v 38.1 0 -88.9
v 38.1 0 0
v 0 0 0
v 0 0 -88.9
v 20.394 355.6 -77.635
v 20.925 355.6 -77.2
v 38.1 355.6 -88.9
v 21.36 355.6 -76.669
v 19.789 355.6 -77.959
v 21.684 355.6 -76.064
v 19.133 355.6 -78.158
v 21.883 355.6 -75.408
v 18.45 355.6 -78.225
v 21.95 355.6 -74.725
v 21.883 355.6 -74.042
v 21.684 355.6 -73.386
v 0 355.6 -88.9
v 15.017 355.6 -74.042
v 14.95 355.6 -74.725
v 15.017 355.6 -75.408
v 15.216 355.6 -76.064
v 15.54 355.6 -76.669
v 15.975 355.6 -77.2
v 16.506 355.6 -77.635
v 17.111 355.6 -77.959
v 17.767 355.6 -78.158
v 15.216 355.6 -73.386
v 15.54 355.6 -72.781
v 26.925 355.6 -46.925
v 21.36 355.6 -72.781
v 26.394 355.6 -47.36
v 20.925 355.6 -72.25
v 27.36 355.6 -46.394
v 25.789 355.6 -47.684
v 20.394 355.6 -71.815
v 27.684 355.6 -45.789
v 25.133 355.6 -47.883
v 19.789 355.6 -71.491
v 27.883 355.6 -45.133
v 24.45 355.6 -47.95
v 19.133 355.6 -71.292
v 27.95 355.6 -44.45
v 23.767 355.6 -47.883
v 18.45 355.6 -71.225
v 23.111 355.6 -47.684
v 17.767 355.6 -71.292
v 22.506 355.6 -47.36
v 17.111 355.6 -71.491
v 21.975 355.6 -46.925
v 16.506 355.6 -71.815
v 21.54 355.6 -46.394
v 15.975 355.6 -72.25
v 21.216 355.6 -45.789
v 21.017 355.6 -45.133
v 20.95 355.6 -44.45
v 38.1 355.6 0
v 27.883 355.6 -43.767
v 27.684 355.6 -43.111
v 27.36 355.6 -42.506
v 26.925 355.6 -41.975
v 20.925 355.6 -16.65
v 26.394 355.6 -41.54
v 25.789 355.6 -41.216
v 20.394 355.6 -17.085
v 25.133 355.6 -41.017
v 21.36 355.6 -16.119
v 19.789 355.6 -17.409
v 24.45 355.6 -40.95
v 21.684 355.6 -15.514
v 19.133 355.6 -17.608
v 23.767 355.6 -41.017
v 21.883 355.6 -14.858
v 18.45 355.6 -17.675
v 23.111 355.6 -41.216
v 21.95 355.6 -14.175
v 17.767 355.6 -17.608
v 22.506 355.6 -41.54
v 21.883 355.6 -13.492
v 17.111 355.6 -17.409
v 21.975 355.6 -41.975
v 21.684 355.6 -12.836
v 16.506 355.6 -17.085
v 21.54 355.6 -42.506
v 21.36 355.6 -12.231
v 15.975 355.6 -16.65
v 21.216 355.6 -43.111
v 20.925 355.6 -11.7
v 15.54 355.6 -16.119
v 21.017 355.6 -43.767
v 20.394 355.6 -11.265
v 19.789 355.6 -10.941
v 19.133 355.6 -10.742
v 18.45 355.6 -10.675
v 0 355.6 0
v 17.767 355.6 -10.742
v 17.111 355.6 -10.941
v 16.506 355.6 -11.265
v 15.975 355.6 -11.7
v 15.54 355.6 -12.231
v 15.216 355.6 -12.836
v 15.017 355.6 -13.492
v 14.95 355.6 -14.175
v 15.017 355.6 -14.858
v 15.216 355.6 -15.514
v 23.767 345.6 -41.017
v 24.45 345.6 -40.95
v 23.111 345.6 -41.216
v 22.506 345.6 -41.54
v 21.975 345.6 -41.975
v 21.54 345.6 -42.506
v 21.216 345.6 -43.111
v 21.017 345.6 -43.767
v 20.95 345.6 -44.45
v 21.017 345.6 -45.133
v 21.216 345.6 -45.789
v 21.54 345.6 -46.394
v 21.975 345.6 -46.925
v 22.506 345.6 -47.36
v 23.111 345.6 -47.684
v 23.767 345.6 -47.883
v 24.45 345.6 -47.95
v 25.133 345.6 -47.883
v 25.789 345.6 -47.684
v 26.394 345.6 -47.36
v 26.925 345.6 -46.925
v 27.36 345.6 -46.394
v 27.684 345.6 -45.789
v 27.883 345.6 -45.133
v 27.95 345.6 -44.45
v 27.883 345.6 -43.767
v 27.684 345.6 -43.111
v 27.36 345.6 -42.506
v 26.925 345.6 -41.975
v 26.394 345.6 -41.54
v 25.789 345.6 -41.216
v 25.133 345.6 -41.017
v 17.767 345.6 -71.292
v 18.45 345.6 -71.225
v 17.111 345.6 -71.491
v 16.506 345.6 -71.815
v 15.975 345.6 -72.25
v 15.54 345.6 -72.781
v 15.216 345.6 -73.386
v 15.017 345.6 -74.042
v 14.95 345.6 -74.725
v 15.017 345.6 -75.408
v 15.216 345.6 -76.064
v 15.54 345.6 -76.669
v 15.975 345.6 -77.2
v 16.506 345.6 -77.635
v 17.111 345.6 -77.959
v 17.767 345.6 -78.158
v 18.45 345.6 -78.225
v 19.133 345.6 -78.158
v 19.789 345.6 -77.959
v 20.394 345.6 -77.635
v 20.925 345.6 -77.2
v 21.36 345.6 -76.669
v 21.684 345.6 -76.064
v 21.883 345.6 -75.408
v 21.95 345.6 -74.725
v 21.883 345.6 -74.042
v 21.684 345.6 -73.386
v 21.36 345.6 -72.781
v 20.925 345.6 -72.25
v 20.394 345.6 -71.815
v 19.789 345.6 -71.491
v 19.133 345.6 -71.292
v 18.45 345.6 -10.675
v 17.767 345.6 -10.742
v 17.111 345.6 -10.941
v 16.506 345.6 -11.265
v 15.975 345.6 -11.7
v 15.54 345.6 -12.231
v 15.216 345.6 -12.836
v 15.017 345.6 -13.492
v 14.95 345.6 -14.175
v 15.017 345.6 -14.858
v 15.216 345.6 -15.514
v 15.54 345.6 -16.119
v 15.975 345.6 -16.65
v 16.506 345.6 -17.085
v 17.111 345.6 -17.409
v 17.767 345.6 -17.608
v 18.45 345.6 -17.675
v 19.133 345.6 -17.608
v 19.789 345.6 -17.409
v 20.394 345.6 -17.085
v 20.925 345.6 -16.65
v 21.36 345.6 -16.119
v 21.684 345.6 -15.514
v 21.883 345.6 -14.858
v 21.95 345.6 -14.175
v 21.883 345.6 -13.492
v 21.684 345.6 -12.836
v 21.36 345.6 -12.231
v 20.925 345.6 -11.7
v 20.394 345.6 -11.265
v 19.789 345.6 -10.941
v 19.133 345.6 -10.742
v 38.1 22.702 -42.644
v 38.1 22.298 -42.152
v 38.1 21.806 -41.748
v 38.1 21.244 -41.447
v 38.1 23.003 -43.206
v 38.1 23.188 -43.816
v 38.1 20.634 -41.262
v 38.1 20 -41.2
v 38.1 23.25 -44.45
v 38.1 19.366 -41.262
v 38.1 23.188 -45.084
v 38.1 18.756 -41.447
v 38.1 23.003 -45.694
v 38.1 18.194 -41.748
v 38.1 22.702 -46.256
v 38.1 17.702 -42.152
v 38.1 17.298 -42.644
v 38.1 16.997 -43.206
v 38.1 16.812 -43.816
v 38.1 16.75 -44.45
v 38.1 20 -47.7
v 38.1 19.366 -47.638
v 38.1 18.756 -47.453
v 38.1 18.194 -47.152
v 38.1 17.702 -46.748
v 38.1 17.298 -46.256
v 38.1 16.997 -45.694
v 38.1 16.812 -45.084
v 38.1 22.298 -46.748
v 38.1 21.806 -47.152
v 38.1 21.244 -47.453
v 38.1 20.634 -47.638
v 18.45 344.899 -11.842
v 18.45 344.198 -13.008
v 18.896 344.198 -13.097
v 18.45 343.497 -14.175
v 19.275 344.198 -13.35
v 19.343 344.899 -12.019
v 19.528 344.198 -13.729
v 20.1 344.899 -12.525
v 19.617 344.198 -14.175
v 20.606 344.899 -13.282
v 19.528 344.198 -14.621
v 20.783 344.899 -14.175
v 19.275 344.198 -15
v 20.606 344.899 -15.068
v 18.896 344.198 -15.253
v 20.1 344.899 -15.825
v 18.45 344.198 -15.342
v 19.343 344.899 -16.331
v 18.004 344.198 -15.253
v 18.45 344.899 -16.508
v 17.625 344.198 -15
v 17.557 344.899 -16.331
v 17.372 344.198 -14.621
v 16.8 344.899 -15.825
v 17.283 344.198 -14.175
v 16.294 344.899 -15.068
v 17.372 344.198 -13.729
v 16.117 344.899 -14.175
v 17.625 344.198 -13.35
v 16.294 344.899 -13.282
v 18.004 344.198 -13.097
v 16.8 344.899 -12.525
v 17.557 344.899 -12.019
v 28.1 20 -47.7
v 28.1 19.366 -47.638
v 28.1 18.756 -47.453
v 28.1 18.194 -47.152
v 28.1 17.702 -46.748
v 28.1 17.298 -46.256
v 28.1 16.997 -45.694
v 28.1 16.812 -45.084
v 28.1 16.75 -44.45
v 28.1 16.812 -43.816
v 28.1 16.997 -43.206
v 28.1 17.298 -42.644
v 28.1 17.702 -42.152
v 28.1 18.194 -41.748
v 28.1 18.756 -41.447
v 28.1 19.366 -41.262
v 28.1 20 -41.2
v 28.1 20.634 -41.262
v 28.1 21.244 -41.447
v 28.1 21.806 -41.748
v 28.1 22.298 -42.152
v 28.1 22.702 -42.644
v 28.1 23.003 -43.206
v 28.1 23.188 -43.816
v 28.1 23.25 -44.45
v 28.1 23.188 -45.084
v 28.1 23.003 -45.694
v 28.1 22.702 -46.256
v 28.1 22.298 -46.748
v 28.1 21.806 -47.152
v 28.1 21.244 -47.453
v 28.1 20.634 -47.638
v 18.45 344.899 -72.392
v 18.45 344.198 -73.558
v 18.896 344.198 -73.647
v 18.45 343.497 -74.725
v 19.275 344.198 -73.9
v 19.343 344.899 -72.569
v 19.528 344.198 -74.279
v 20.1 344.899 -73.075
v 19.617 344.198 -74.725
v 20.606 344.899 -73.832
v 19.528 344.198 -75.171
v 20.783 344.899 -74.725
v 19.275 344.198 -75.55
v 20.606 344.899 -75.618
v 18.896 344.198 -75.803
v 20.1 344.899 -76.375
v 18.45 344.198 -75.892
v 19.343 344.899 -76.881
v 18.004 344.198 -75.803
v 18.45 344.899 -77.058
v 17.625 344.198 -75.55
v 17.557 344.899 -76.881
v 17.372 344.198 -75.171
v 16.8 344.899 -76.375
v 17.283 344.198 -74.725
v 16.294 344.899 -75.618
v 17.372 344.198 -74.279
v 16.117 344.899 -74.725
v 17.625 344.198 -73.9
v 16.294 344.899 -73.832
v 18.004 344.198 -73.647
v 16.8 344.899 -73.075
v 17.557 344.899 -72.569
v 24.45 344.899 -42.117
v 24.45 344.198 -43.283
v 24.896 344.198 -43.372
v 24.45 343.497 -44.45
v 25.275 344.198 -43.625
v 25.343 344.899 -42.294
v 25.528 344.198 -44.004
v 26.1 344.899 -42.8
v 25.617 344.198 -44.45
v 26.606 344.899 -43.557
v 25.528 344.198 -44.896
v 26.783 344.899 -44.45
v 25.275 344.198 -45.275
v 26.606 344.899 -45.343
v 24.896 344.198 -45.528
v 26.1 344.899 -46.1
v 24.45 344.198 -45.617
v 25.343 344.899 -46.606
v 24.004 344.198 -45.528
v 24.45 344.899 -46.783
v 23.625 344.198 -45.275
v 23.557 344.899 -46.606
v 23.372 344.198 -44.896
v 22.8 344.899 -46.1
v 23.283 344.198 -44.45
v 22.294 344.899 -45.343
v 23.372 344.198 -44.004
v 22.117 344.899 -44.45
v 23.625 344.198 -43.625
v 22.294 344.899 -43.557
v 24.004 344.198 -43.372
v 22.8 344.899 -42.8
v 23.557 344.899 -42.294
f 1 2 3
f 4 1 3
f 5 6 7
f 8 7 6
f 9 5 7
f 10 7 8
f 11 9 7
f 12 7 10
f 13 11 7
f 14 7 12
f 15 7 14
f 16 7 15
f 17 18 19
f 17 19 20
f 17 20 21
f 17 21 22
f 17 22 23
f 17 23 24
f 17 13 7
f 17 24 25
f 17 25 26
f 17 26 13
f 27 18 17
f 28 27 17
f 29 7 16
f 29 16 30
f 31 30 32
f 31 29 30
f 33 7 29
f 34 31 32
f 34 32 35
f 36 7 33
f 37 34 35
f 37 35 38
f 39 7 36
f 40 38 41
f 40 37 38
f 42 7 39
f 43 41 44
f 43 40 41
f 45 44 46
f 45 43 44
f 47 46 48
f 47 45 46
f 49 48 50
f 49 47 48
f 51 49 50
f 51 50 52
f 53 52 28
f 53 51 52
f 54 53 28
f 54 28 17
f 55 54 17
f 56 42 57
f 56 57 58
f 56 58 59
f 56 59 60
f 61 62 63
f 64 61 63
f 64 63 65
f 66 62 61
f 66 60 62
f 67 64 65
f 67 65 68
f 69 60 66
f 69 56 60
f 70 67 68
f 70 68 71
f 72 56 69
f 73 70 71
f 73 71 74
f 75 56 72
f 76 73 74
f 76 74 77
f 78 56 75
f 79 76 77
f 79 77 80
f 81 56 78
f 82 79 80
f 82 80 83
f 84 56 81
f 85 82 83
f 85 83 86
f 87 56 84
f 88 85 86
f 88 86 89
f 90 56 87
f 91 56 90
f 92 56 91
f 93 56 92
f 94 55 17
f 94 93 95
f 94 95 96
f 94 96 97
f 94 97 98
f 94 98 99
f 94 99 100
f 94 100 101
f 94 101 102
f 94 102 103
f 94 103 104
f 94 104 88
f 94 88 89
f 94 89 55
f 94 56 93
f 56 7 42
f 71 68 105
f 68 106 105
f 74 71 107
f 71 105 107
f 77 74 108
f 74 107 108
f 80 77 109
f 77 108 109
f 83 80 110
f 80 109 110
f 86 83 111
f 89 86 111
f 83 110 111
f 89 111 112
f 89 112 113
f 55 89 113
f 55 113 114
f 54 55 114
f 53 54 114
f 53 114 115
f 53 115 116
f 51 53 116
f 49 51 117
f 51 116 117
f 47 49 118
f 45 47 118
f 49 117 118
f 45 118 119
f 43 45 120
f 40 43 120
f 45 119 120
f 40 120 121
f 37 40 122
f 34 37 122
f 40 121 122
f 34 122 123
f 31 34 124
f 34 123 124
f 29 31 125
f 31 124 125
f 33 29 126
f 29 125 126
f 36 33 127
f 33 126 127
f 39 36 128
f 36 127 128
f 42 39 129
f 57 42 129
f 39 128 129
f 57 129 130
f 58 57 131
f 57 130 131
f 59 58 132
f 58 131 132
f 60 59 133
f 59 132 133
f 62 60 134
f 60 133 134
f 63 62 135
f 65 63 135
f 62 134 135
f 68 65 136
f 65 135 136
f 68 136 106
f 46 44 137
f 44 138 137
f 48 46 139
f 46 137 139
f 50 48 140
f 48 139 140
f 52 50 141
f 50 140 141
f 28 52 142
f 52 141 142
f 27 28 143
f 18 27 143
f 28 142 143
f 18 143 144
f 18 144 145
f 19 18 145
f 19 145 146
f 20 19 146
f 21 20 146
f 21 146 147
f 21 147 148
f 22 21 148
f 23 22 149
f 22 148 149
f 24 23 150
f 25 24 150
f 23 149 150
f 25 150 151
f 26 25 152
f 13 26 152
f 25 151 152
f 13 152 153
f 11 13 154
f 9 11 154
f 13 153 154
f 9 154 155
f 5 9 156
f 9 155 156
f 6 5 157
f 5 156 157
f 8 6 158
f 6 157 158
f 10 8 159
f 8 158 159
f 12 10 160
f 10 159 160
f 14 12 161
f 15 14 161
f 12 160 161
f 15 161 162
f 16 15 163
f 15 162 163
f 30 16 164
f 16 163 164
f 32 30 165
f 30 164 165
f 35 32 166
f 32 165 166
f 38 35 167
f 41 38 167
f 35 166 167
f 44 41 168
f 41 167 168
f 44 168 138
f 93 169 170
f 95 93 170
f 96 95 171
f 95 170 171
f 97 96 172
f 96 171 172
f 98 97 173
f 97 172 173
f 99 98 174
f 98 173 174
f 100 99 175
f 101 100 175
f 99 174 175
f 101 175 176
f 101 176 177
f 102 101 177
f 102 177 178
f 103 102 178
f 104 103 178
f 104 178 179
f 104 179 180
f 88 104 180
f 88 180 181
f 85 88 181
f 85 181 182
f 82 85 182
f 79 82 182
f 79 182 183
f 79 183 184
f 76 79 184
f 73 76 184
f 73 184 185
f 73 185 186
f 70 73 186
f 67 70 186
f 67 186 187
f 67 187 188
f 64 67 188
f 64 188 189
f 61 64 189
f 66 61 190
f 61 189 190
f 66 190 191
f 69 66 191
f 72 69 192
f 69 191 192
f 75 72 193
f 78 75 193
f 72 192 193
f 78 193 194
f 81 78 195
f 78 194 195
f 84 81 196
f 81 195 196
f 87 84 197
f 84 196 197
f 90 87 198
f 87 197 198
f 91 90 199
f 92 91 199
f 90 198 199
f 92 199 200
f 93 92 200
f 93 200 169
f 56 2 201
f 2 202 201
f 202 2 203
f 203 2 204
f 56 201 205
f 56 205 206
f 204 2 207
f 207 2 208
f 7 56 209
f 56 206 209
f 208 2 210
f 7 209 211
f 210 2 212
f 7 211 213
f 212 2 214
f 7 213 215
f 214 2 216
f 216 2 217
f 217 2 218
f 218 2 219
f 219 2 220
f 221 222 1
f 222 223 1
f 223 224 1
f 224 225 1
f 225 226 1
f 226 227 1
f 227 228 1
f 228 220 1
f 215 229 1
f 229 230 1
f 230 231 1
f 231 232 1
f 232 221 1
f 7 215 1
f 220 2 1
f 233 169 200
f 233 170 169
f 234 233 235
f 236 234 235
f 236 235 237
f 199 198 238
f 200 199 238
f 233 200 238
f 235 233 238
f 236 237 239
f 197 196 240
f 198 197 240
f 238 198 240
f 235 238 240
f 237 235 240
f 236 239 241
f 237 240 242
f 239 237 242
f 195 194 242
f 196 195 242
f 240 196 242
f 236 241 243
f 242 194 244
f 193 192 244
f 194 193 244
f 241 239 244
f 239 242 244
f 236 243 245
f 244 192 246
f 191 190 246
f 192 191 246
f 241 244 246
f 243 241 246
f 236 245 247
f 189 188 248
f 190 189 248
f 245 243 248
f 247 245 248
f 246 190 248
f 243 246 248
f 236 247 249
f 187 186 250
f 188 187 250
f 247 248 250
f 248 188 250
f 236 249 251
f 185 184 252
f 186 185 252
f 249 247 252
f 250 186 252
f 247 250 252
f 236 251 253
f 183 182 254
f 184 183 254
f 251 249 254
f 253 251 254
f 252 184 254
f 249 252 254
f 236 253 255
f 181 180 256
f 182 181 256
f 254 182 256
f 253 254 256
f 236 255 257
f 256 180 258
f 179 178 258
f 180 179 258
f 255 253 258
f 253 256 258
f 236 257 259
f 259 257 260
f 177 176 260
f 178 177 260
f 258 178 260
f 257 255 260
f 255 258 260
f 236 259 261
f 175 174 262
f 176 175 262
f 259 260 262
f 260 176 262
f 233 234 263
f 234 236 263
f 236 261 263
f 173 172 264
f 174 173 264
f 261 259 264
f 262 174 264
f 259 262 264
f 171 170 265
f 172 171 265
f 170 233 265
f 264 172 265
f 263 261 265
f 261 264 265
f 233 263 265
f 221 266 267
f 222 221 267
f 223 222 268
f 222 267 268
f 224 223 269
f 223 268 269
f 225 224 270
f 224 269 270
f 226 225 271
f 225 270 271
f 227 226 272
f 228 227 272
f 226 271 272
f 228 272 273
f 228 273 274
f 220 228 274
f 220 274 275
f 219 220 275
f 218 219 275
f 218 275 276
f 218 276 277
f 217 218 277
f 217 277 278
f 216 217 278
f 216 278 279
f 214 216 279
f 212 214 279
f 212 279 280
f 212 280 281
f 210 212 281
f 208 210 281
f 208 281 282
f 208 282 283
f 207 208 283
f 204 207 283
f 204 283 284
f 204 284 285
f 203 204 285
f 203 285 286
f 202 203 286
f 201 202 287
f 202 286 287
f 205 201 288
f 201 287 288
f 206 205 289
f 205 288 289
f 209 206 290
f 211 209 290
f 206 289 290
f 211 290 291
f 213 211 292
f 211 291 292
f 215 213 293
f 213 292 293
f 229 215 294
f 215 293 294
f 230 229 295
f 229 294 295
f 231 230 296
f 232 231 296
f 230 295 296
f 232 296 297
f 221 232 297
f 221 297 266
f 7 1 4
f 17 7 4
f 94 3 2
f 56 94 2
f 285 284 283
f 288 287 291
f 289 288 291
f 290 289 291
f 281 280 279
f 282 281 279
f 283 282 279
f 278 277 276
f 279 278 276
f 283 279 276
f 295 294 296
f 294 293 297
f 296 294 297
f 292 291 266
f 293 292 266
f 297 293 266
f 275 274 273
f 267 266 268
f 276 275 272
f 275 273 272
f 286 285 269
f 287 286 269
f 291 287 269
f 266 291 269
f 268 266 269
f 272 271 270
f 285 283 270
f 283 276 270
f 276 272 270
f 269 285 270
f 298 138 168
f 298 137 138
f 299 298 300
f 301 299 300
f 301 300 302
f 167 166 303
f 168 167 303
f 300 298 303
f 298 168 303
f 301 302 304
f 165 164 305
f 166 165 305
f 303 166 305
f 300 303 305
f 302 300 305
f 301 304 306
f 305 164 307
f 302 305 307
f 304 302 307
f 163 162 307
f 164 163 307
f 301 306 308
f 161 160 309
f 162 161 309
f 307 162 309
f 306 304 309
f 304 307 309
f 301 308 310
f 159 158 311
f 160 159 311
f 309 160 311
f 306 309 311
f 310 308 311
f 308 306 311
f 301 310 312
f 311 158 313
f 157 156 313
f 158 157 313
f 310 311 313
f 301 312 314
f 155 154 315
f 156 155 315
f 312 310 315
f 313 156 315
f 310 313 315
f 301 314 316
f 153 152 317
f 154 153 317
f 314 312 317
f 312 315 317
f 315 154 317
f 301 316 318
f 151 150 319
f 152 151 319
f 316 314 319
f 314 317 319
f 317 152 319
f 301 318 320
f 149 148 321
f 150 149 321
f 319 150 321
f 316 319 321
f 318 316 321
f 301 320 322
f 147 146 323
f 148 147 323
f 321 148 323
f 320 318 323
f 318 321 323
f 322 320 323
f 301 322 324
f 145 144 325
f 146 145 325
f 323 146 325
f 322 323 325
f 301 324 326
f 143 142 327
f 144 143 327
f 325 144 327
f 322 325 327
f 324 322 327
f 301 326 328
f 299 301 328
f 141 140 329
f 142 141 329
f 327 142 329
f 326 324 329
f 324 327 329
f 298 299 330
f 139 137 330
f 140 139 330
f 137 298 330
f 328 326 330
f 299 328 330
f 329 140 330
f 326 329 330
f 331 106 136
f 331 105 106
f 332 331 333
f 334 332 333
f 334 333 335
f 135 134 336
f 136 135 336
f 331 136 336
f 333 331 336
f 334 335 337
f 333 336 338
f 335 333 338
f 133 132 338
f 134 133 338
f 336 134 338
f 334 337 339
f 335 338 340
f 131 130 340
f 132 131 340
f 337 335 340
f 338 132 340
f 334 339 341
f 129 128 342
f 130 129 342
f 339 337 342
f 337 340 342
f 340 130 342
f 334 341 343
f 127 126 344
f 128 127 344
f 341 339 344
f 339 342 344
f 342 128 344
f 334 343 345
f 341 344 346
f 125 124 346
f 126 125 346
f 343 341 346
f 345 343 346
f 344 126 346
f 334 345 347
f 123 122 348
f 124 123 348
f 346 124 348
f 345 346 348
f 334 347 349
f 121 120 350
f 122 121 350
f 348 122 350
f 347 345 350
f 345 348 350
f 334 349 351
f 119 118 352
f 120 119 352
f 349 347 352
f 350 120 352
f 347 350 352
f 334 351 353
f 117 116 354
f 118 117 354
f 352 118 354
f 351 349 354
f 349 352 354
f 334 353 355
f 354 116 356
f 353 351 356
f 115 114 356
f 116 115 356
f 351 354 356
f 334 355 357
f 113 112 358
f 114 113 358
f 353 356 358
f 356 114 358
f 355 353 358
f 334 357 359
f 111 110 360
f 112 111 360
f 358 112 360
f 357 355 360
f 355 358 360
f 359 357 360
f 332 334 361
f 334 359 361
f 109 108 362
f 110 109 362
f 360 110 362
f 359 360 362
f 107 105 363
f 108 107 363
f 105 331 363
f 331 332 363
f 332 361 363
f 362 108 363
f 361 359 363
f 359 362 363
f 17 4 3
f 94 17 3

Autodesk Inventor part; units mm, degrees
ref_plane "YZ Plane" through (0, 0, 0) normal (1, 0, 0) x (0, 1, 0)
ref_plane "XZ Plane" through (0, 0, 0) normal (0, 1, 0) x (-1, 0, 0)
ref_plane "XY Plane" through (0, 0, 0) normal (0, 0, 1) x (1, 0, 0)
sketch "Sketch1" plane through (0, 0, 0) normal (0, 1, 0) x (-1, 0, 0)
  line L0 (0, 0) -> (-38.1, 0)
  line L1 (-38.1, 0) -> (-38.1, -88.9)
  line L2 (-38.1, -88.9) -> (0, -88.9)
  line L3 (0, -88.9) -> (0, 0)
  dimension "d0" = 38.1
  dimension "d1" = 88.9
extrude "Extrusion1" add sketch "Sketch1" along normal blind 355.6
sketch "Sketch3" plane through (0, 355.6, 0) normal (0, 1, 0) x (1, 0, 0)
  line L0 (0, 88.9) -> (0, 0) projected
  line L1 (0, 74.725) -> (18.45, 74.725)
  line L2 (18.45, 74.725) -> (18.45, 0) construction
  line L3 (18.45, 0) -> (0, 0)
  line L4 (0, 0) -> (0, 74.725)
  line L5 (38.1, 88.9) -> (0, 88.9) projected
  line L6 (18.45, 74.725) -> (18.45, 61.2)
  line L7 (18.45, 74.725) -> (18.45, 14.175)
  line L8 (18.45, 44.45) -> (24.45, 44.45)
  line L9 (0, 0) -> (38.1, 0) projected
  dimension "d35" = 60.55
  dimension "d42" = 6
  dimension "d43" = 30.275
  dimension "d45" = 14.175
  dimension "d46" = 14.175
  dimension "d48" = 24.45
  dimension "d49" = 44.45
hole "Hole1" at (18.45, 355.6, -74.725) at (24.45, 355.6, -44.45) at (18.45, 355.6, -14.175) direction (0, -1, 0) diameter 7 depth 10 tip angle 118
sketch "Sketch4" plane through (38.1, 0, 0) normal (1, 0, 0) x (0, 0, -1)
  line L0 (0, 0) -> (88.9, 0) projected
  line L1 (0, 0) -> (44.45, 0) construction
  line L2 (44.45, 0) -> (44.45, 20) construction
  line L3 (44.45, 20) -> (0, 20) construction
  line L4 (0, 20) -> (0, 0) construction
  dimension "d25" = 44.45
  dimension "d26" = 20
hole "Hole2" at (38.1, 20, -44.45) direction (-1, 0, 0) diameter 6.5 depth 10
properties part number "shin2x4" material "Wood (Birch)"
